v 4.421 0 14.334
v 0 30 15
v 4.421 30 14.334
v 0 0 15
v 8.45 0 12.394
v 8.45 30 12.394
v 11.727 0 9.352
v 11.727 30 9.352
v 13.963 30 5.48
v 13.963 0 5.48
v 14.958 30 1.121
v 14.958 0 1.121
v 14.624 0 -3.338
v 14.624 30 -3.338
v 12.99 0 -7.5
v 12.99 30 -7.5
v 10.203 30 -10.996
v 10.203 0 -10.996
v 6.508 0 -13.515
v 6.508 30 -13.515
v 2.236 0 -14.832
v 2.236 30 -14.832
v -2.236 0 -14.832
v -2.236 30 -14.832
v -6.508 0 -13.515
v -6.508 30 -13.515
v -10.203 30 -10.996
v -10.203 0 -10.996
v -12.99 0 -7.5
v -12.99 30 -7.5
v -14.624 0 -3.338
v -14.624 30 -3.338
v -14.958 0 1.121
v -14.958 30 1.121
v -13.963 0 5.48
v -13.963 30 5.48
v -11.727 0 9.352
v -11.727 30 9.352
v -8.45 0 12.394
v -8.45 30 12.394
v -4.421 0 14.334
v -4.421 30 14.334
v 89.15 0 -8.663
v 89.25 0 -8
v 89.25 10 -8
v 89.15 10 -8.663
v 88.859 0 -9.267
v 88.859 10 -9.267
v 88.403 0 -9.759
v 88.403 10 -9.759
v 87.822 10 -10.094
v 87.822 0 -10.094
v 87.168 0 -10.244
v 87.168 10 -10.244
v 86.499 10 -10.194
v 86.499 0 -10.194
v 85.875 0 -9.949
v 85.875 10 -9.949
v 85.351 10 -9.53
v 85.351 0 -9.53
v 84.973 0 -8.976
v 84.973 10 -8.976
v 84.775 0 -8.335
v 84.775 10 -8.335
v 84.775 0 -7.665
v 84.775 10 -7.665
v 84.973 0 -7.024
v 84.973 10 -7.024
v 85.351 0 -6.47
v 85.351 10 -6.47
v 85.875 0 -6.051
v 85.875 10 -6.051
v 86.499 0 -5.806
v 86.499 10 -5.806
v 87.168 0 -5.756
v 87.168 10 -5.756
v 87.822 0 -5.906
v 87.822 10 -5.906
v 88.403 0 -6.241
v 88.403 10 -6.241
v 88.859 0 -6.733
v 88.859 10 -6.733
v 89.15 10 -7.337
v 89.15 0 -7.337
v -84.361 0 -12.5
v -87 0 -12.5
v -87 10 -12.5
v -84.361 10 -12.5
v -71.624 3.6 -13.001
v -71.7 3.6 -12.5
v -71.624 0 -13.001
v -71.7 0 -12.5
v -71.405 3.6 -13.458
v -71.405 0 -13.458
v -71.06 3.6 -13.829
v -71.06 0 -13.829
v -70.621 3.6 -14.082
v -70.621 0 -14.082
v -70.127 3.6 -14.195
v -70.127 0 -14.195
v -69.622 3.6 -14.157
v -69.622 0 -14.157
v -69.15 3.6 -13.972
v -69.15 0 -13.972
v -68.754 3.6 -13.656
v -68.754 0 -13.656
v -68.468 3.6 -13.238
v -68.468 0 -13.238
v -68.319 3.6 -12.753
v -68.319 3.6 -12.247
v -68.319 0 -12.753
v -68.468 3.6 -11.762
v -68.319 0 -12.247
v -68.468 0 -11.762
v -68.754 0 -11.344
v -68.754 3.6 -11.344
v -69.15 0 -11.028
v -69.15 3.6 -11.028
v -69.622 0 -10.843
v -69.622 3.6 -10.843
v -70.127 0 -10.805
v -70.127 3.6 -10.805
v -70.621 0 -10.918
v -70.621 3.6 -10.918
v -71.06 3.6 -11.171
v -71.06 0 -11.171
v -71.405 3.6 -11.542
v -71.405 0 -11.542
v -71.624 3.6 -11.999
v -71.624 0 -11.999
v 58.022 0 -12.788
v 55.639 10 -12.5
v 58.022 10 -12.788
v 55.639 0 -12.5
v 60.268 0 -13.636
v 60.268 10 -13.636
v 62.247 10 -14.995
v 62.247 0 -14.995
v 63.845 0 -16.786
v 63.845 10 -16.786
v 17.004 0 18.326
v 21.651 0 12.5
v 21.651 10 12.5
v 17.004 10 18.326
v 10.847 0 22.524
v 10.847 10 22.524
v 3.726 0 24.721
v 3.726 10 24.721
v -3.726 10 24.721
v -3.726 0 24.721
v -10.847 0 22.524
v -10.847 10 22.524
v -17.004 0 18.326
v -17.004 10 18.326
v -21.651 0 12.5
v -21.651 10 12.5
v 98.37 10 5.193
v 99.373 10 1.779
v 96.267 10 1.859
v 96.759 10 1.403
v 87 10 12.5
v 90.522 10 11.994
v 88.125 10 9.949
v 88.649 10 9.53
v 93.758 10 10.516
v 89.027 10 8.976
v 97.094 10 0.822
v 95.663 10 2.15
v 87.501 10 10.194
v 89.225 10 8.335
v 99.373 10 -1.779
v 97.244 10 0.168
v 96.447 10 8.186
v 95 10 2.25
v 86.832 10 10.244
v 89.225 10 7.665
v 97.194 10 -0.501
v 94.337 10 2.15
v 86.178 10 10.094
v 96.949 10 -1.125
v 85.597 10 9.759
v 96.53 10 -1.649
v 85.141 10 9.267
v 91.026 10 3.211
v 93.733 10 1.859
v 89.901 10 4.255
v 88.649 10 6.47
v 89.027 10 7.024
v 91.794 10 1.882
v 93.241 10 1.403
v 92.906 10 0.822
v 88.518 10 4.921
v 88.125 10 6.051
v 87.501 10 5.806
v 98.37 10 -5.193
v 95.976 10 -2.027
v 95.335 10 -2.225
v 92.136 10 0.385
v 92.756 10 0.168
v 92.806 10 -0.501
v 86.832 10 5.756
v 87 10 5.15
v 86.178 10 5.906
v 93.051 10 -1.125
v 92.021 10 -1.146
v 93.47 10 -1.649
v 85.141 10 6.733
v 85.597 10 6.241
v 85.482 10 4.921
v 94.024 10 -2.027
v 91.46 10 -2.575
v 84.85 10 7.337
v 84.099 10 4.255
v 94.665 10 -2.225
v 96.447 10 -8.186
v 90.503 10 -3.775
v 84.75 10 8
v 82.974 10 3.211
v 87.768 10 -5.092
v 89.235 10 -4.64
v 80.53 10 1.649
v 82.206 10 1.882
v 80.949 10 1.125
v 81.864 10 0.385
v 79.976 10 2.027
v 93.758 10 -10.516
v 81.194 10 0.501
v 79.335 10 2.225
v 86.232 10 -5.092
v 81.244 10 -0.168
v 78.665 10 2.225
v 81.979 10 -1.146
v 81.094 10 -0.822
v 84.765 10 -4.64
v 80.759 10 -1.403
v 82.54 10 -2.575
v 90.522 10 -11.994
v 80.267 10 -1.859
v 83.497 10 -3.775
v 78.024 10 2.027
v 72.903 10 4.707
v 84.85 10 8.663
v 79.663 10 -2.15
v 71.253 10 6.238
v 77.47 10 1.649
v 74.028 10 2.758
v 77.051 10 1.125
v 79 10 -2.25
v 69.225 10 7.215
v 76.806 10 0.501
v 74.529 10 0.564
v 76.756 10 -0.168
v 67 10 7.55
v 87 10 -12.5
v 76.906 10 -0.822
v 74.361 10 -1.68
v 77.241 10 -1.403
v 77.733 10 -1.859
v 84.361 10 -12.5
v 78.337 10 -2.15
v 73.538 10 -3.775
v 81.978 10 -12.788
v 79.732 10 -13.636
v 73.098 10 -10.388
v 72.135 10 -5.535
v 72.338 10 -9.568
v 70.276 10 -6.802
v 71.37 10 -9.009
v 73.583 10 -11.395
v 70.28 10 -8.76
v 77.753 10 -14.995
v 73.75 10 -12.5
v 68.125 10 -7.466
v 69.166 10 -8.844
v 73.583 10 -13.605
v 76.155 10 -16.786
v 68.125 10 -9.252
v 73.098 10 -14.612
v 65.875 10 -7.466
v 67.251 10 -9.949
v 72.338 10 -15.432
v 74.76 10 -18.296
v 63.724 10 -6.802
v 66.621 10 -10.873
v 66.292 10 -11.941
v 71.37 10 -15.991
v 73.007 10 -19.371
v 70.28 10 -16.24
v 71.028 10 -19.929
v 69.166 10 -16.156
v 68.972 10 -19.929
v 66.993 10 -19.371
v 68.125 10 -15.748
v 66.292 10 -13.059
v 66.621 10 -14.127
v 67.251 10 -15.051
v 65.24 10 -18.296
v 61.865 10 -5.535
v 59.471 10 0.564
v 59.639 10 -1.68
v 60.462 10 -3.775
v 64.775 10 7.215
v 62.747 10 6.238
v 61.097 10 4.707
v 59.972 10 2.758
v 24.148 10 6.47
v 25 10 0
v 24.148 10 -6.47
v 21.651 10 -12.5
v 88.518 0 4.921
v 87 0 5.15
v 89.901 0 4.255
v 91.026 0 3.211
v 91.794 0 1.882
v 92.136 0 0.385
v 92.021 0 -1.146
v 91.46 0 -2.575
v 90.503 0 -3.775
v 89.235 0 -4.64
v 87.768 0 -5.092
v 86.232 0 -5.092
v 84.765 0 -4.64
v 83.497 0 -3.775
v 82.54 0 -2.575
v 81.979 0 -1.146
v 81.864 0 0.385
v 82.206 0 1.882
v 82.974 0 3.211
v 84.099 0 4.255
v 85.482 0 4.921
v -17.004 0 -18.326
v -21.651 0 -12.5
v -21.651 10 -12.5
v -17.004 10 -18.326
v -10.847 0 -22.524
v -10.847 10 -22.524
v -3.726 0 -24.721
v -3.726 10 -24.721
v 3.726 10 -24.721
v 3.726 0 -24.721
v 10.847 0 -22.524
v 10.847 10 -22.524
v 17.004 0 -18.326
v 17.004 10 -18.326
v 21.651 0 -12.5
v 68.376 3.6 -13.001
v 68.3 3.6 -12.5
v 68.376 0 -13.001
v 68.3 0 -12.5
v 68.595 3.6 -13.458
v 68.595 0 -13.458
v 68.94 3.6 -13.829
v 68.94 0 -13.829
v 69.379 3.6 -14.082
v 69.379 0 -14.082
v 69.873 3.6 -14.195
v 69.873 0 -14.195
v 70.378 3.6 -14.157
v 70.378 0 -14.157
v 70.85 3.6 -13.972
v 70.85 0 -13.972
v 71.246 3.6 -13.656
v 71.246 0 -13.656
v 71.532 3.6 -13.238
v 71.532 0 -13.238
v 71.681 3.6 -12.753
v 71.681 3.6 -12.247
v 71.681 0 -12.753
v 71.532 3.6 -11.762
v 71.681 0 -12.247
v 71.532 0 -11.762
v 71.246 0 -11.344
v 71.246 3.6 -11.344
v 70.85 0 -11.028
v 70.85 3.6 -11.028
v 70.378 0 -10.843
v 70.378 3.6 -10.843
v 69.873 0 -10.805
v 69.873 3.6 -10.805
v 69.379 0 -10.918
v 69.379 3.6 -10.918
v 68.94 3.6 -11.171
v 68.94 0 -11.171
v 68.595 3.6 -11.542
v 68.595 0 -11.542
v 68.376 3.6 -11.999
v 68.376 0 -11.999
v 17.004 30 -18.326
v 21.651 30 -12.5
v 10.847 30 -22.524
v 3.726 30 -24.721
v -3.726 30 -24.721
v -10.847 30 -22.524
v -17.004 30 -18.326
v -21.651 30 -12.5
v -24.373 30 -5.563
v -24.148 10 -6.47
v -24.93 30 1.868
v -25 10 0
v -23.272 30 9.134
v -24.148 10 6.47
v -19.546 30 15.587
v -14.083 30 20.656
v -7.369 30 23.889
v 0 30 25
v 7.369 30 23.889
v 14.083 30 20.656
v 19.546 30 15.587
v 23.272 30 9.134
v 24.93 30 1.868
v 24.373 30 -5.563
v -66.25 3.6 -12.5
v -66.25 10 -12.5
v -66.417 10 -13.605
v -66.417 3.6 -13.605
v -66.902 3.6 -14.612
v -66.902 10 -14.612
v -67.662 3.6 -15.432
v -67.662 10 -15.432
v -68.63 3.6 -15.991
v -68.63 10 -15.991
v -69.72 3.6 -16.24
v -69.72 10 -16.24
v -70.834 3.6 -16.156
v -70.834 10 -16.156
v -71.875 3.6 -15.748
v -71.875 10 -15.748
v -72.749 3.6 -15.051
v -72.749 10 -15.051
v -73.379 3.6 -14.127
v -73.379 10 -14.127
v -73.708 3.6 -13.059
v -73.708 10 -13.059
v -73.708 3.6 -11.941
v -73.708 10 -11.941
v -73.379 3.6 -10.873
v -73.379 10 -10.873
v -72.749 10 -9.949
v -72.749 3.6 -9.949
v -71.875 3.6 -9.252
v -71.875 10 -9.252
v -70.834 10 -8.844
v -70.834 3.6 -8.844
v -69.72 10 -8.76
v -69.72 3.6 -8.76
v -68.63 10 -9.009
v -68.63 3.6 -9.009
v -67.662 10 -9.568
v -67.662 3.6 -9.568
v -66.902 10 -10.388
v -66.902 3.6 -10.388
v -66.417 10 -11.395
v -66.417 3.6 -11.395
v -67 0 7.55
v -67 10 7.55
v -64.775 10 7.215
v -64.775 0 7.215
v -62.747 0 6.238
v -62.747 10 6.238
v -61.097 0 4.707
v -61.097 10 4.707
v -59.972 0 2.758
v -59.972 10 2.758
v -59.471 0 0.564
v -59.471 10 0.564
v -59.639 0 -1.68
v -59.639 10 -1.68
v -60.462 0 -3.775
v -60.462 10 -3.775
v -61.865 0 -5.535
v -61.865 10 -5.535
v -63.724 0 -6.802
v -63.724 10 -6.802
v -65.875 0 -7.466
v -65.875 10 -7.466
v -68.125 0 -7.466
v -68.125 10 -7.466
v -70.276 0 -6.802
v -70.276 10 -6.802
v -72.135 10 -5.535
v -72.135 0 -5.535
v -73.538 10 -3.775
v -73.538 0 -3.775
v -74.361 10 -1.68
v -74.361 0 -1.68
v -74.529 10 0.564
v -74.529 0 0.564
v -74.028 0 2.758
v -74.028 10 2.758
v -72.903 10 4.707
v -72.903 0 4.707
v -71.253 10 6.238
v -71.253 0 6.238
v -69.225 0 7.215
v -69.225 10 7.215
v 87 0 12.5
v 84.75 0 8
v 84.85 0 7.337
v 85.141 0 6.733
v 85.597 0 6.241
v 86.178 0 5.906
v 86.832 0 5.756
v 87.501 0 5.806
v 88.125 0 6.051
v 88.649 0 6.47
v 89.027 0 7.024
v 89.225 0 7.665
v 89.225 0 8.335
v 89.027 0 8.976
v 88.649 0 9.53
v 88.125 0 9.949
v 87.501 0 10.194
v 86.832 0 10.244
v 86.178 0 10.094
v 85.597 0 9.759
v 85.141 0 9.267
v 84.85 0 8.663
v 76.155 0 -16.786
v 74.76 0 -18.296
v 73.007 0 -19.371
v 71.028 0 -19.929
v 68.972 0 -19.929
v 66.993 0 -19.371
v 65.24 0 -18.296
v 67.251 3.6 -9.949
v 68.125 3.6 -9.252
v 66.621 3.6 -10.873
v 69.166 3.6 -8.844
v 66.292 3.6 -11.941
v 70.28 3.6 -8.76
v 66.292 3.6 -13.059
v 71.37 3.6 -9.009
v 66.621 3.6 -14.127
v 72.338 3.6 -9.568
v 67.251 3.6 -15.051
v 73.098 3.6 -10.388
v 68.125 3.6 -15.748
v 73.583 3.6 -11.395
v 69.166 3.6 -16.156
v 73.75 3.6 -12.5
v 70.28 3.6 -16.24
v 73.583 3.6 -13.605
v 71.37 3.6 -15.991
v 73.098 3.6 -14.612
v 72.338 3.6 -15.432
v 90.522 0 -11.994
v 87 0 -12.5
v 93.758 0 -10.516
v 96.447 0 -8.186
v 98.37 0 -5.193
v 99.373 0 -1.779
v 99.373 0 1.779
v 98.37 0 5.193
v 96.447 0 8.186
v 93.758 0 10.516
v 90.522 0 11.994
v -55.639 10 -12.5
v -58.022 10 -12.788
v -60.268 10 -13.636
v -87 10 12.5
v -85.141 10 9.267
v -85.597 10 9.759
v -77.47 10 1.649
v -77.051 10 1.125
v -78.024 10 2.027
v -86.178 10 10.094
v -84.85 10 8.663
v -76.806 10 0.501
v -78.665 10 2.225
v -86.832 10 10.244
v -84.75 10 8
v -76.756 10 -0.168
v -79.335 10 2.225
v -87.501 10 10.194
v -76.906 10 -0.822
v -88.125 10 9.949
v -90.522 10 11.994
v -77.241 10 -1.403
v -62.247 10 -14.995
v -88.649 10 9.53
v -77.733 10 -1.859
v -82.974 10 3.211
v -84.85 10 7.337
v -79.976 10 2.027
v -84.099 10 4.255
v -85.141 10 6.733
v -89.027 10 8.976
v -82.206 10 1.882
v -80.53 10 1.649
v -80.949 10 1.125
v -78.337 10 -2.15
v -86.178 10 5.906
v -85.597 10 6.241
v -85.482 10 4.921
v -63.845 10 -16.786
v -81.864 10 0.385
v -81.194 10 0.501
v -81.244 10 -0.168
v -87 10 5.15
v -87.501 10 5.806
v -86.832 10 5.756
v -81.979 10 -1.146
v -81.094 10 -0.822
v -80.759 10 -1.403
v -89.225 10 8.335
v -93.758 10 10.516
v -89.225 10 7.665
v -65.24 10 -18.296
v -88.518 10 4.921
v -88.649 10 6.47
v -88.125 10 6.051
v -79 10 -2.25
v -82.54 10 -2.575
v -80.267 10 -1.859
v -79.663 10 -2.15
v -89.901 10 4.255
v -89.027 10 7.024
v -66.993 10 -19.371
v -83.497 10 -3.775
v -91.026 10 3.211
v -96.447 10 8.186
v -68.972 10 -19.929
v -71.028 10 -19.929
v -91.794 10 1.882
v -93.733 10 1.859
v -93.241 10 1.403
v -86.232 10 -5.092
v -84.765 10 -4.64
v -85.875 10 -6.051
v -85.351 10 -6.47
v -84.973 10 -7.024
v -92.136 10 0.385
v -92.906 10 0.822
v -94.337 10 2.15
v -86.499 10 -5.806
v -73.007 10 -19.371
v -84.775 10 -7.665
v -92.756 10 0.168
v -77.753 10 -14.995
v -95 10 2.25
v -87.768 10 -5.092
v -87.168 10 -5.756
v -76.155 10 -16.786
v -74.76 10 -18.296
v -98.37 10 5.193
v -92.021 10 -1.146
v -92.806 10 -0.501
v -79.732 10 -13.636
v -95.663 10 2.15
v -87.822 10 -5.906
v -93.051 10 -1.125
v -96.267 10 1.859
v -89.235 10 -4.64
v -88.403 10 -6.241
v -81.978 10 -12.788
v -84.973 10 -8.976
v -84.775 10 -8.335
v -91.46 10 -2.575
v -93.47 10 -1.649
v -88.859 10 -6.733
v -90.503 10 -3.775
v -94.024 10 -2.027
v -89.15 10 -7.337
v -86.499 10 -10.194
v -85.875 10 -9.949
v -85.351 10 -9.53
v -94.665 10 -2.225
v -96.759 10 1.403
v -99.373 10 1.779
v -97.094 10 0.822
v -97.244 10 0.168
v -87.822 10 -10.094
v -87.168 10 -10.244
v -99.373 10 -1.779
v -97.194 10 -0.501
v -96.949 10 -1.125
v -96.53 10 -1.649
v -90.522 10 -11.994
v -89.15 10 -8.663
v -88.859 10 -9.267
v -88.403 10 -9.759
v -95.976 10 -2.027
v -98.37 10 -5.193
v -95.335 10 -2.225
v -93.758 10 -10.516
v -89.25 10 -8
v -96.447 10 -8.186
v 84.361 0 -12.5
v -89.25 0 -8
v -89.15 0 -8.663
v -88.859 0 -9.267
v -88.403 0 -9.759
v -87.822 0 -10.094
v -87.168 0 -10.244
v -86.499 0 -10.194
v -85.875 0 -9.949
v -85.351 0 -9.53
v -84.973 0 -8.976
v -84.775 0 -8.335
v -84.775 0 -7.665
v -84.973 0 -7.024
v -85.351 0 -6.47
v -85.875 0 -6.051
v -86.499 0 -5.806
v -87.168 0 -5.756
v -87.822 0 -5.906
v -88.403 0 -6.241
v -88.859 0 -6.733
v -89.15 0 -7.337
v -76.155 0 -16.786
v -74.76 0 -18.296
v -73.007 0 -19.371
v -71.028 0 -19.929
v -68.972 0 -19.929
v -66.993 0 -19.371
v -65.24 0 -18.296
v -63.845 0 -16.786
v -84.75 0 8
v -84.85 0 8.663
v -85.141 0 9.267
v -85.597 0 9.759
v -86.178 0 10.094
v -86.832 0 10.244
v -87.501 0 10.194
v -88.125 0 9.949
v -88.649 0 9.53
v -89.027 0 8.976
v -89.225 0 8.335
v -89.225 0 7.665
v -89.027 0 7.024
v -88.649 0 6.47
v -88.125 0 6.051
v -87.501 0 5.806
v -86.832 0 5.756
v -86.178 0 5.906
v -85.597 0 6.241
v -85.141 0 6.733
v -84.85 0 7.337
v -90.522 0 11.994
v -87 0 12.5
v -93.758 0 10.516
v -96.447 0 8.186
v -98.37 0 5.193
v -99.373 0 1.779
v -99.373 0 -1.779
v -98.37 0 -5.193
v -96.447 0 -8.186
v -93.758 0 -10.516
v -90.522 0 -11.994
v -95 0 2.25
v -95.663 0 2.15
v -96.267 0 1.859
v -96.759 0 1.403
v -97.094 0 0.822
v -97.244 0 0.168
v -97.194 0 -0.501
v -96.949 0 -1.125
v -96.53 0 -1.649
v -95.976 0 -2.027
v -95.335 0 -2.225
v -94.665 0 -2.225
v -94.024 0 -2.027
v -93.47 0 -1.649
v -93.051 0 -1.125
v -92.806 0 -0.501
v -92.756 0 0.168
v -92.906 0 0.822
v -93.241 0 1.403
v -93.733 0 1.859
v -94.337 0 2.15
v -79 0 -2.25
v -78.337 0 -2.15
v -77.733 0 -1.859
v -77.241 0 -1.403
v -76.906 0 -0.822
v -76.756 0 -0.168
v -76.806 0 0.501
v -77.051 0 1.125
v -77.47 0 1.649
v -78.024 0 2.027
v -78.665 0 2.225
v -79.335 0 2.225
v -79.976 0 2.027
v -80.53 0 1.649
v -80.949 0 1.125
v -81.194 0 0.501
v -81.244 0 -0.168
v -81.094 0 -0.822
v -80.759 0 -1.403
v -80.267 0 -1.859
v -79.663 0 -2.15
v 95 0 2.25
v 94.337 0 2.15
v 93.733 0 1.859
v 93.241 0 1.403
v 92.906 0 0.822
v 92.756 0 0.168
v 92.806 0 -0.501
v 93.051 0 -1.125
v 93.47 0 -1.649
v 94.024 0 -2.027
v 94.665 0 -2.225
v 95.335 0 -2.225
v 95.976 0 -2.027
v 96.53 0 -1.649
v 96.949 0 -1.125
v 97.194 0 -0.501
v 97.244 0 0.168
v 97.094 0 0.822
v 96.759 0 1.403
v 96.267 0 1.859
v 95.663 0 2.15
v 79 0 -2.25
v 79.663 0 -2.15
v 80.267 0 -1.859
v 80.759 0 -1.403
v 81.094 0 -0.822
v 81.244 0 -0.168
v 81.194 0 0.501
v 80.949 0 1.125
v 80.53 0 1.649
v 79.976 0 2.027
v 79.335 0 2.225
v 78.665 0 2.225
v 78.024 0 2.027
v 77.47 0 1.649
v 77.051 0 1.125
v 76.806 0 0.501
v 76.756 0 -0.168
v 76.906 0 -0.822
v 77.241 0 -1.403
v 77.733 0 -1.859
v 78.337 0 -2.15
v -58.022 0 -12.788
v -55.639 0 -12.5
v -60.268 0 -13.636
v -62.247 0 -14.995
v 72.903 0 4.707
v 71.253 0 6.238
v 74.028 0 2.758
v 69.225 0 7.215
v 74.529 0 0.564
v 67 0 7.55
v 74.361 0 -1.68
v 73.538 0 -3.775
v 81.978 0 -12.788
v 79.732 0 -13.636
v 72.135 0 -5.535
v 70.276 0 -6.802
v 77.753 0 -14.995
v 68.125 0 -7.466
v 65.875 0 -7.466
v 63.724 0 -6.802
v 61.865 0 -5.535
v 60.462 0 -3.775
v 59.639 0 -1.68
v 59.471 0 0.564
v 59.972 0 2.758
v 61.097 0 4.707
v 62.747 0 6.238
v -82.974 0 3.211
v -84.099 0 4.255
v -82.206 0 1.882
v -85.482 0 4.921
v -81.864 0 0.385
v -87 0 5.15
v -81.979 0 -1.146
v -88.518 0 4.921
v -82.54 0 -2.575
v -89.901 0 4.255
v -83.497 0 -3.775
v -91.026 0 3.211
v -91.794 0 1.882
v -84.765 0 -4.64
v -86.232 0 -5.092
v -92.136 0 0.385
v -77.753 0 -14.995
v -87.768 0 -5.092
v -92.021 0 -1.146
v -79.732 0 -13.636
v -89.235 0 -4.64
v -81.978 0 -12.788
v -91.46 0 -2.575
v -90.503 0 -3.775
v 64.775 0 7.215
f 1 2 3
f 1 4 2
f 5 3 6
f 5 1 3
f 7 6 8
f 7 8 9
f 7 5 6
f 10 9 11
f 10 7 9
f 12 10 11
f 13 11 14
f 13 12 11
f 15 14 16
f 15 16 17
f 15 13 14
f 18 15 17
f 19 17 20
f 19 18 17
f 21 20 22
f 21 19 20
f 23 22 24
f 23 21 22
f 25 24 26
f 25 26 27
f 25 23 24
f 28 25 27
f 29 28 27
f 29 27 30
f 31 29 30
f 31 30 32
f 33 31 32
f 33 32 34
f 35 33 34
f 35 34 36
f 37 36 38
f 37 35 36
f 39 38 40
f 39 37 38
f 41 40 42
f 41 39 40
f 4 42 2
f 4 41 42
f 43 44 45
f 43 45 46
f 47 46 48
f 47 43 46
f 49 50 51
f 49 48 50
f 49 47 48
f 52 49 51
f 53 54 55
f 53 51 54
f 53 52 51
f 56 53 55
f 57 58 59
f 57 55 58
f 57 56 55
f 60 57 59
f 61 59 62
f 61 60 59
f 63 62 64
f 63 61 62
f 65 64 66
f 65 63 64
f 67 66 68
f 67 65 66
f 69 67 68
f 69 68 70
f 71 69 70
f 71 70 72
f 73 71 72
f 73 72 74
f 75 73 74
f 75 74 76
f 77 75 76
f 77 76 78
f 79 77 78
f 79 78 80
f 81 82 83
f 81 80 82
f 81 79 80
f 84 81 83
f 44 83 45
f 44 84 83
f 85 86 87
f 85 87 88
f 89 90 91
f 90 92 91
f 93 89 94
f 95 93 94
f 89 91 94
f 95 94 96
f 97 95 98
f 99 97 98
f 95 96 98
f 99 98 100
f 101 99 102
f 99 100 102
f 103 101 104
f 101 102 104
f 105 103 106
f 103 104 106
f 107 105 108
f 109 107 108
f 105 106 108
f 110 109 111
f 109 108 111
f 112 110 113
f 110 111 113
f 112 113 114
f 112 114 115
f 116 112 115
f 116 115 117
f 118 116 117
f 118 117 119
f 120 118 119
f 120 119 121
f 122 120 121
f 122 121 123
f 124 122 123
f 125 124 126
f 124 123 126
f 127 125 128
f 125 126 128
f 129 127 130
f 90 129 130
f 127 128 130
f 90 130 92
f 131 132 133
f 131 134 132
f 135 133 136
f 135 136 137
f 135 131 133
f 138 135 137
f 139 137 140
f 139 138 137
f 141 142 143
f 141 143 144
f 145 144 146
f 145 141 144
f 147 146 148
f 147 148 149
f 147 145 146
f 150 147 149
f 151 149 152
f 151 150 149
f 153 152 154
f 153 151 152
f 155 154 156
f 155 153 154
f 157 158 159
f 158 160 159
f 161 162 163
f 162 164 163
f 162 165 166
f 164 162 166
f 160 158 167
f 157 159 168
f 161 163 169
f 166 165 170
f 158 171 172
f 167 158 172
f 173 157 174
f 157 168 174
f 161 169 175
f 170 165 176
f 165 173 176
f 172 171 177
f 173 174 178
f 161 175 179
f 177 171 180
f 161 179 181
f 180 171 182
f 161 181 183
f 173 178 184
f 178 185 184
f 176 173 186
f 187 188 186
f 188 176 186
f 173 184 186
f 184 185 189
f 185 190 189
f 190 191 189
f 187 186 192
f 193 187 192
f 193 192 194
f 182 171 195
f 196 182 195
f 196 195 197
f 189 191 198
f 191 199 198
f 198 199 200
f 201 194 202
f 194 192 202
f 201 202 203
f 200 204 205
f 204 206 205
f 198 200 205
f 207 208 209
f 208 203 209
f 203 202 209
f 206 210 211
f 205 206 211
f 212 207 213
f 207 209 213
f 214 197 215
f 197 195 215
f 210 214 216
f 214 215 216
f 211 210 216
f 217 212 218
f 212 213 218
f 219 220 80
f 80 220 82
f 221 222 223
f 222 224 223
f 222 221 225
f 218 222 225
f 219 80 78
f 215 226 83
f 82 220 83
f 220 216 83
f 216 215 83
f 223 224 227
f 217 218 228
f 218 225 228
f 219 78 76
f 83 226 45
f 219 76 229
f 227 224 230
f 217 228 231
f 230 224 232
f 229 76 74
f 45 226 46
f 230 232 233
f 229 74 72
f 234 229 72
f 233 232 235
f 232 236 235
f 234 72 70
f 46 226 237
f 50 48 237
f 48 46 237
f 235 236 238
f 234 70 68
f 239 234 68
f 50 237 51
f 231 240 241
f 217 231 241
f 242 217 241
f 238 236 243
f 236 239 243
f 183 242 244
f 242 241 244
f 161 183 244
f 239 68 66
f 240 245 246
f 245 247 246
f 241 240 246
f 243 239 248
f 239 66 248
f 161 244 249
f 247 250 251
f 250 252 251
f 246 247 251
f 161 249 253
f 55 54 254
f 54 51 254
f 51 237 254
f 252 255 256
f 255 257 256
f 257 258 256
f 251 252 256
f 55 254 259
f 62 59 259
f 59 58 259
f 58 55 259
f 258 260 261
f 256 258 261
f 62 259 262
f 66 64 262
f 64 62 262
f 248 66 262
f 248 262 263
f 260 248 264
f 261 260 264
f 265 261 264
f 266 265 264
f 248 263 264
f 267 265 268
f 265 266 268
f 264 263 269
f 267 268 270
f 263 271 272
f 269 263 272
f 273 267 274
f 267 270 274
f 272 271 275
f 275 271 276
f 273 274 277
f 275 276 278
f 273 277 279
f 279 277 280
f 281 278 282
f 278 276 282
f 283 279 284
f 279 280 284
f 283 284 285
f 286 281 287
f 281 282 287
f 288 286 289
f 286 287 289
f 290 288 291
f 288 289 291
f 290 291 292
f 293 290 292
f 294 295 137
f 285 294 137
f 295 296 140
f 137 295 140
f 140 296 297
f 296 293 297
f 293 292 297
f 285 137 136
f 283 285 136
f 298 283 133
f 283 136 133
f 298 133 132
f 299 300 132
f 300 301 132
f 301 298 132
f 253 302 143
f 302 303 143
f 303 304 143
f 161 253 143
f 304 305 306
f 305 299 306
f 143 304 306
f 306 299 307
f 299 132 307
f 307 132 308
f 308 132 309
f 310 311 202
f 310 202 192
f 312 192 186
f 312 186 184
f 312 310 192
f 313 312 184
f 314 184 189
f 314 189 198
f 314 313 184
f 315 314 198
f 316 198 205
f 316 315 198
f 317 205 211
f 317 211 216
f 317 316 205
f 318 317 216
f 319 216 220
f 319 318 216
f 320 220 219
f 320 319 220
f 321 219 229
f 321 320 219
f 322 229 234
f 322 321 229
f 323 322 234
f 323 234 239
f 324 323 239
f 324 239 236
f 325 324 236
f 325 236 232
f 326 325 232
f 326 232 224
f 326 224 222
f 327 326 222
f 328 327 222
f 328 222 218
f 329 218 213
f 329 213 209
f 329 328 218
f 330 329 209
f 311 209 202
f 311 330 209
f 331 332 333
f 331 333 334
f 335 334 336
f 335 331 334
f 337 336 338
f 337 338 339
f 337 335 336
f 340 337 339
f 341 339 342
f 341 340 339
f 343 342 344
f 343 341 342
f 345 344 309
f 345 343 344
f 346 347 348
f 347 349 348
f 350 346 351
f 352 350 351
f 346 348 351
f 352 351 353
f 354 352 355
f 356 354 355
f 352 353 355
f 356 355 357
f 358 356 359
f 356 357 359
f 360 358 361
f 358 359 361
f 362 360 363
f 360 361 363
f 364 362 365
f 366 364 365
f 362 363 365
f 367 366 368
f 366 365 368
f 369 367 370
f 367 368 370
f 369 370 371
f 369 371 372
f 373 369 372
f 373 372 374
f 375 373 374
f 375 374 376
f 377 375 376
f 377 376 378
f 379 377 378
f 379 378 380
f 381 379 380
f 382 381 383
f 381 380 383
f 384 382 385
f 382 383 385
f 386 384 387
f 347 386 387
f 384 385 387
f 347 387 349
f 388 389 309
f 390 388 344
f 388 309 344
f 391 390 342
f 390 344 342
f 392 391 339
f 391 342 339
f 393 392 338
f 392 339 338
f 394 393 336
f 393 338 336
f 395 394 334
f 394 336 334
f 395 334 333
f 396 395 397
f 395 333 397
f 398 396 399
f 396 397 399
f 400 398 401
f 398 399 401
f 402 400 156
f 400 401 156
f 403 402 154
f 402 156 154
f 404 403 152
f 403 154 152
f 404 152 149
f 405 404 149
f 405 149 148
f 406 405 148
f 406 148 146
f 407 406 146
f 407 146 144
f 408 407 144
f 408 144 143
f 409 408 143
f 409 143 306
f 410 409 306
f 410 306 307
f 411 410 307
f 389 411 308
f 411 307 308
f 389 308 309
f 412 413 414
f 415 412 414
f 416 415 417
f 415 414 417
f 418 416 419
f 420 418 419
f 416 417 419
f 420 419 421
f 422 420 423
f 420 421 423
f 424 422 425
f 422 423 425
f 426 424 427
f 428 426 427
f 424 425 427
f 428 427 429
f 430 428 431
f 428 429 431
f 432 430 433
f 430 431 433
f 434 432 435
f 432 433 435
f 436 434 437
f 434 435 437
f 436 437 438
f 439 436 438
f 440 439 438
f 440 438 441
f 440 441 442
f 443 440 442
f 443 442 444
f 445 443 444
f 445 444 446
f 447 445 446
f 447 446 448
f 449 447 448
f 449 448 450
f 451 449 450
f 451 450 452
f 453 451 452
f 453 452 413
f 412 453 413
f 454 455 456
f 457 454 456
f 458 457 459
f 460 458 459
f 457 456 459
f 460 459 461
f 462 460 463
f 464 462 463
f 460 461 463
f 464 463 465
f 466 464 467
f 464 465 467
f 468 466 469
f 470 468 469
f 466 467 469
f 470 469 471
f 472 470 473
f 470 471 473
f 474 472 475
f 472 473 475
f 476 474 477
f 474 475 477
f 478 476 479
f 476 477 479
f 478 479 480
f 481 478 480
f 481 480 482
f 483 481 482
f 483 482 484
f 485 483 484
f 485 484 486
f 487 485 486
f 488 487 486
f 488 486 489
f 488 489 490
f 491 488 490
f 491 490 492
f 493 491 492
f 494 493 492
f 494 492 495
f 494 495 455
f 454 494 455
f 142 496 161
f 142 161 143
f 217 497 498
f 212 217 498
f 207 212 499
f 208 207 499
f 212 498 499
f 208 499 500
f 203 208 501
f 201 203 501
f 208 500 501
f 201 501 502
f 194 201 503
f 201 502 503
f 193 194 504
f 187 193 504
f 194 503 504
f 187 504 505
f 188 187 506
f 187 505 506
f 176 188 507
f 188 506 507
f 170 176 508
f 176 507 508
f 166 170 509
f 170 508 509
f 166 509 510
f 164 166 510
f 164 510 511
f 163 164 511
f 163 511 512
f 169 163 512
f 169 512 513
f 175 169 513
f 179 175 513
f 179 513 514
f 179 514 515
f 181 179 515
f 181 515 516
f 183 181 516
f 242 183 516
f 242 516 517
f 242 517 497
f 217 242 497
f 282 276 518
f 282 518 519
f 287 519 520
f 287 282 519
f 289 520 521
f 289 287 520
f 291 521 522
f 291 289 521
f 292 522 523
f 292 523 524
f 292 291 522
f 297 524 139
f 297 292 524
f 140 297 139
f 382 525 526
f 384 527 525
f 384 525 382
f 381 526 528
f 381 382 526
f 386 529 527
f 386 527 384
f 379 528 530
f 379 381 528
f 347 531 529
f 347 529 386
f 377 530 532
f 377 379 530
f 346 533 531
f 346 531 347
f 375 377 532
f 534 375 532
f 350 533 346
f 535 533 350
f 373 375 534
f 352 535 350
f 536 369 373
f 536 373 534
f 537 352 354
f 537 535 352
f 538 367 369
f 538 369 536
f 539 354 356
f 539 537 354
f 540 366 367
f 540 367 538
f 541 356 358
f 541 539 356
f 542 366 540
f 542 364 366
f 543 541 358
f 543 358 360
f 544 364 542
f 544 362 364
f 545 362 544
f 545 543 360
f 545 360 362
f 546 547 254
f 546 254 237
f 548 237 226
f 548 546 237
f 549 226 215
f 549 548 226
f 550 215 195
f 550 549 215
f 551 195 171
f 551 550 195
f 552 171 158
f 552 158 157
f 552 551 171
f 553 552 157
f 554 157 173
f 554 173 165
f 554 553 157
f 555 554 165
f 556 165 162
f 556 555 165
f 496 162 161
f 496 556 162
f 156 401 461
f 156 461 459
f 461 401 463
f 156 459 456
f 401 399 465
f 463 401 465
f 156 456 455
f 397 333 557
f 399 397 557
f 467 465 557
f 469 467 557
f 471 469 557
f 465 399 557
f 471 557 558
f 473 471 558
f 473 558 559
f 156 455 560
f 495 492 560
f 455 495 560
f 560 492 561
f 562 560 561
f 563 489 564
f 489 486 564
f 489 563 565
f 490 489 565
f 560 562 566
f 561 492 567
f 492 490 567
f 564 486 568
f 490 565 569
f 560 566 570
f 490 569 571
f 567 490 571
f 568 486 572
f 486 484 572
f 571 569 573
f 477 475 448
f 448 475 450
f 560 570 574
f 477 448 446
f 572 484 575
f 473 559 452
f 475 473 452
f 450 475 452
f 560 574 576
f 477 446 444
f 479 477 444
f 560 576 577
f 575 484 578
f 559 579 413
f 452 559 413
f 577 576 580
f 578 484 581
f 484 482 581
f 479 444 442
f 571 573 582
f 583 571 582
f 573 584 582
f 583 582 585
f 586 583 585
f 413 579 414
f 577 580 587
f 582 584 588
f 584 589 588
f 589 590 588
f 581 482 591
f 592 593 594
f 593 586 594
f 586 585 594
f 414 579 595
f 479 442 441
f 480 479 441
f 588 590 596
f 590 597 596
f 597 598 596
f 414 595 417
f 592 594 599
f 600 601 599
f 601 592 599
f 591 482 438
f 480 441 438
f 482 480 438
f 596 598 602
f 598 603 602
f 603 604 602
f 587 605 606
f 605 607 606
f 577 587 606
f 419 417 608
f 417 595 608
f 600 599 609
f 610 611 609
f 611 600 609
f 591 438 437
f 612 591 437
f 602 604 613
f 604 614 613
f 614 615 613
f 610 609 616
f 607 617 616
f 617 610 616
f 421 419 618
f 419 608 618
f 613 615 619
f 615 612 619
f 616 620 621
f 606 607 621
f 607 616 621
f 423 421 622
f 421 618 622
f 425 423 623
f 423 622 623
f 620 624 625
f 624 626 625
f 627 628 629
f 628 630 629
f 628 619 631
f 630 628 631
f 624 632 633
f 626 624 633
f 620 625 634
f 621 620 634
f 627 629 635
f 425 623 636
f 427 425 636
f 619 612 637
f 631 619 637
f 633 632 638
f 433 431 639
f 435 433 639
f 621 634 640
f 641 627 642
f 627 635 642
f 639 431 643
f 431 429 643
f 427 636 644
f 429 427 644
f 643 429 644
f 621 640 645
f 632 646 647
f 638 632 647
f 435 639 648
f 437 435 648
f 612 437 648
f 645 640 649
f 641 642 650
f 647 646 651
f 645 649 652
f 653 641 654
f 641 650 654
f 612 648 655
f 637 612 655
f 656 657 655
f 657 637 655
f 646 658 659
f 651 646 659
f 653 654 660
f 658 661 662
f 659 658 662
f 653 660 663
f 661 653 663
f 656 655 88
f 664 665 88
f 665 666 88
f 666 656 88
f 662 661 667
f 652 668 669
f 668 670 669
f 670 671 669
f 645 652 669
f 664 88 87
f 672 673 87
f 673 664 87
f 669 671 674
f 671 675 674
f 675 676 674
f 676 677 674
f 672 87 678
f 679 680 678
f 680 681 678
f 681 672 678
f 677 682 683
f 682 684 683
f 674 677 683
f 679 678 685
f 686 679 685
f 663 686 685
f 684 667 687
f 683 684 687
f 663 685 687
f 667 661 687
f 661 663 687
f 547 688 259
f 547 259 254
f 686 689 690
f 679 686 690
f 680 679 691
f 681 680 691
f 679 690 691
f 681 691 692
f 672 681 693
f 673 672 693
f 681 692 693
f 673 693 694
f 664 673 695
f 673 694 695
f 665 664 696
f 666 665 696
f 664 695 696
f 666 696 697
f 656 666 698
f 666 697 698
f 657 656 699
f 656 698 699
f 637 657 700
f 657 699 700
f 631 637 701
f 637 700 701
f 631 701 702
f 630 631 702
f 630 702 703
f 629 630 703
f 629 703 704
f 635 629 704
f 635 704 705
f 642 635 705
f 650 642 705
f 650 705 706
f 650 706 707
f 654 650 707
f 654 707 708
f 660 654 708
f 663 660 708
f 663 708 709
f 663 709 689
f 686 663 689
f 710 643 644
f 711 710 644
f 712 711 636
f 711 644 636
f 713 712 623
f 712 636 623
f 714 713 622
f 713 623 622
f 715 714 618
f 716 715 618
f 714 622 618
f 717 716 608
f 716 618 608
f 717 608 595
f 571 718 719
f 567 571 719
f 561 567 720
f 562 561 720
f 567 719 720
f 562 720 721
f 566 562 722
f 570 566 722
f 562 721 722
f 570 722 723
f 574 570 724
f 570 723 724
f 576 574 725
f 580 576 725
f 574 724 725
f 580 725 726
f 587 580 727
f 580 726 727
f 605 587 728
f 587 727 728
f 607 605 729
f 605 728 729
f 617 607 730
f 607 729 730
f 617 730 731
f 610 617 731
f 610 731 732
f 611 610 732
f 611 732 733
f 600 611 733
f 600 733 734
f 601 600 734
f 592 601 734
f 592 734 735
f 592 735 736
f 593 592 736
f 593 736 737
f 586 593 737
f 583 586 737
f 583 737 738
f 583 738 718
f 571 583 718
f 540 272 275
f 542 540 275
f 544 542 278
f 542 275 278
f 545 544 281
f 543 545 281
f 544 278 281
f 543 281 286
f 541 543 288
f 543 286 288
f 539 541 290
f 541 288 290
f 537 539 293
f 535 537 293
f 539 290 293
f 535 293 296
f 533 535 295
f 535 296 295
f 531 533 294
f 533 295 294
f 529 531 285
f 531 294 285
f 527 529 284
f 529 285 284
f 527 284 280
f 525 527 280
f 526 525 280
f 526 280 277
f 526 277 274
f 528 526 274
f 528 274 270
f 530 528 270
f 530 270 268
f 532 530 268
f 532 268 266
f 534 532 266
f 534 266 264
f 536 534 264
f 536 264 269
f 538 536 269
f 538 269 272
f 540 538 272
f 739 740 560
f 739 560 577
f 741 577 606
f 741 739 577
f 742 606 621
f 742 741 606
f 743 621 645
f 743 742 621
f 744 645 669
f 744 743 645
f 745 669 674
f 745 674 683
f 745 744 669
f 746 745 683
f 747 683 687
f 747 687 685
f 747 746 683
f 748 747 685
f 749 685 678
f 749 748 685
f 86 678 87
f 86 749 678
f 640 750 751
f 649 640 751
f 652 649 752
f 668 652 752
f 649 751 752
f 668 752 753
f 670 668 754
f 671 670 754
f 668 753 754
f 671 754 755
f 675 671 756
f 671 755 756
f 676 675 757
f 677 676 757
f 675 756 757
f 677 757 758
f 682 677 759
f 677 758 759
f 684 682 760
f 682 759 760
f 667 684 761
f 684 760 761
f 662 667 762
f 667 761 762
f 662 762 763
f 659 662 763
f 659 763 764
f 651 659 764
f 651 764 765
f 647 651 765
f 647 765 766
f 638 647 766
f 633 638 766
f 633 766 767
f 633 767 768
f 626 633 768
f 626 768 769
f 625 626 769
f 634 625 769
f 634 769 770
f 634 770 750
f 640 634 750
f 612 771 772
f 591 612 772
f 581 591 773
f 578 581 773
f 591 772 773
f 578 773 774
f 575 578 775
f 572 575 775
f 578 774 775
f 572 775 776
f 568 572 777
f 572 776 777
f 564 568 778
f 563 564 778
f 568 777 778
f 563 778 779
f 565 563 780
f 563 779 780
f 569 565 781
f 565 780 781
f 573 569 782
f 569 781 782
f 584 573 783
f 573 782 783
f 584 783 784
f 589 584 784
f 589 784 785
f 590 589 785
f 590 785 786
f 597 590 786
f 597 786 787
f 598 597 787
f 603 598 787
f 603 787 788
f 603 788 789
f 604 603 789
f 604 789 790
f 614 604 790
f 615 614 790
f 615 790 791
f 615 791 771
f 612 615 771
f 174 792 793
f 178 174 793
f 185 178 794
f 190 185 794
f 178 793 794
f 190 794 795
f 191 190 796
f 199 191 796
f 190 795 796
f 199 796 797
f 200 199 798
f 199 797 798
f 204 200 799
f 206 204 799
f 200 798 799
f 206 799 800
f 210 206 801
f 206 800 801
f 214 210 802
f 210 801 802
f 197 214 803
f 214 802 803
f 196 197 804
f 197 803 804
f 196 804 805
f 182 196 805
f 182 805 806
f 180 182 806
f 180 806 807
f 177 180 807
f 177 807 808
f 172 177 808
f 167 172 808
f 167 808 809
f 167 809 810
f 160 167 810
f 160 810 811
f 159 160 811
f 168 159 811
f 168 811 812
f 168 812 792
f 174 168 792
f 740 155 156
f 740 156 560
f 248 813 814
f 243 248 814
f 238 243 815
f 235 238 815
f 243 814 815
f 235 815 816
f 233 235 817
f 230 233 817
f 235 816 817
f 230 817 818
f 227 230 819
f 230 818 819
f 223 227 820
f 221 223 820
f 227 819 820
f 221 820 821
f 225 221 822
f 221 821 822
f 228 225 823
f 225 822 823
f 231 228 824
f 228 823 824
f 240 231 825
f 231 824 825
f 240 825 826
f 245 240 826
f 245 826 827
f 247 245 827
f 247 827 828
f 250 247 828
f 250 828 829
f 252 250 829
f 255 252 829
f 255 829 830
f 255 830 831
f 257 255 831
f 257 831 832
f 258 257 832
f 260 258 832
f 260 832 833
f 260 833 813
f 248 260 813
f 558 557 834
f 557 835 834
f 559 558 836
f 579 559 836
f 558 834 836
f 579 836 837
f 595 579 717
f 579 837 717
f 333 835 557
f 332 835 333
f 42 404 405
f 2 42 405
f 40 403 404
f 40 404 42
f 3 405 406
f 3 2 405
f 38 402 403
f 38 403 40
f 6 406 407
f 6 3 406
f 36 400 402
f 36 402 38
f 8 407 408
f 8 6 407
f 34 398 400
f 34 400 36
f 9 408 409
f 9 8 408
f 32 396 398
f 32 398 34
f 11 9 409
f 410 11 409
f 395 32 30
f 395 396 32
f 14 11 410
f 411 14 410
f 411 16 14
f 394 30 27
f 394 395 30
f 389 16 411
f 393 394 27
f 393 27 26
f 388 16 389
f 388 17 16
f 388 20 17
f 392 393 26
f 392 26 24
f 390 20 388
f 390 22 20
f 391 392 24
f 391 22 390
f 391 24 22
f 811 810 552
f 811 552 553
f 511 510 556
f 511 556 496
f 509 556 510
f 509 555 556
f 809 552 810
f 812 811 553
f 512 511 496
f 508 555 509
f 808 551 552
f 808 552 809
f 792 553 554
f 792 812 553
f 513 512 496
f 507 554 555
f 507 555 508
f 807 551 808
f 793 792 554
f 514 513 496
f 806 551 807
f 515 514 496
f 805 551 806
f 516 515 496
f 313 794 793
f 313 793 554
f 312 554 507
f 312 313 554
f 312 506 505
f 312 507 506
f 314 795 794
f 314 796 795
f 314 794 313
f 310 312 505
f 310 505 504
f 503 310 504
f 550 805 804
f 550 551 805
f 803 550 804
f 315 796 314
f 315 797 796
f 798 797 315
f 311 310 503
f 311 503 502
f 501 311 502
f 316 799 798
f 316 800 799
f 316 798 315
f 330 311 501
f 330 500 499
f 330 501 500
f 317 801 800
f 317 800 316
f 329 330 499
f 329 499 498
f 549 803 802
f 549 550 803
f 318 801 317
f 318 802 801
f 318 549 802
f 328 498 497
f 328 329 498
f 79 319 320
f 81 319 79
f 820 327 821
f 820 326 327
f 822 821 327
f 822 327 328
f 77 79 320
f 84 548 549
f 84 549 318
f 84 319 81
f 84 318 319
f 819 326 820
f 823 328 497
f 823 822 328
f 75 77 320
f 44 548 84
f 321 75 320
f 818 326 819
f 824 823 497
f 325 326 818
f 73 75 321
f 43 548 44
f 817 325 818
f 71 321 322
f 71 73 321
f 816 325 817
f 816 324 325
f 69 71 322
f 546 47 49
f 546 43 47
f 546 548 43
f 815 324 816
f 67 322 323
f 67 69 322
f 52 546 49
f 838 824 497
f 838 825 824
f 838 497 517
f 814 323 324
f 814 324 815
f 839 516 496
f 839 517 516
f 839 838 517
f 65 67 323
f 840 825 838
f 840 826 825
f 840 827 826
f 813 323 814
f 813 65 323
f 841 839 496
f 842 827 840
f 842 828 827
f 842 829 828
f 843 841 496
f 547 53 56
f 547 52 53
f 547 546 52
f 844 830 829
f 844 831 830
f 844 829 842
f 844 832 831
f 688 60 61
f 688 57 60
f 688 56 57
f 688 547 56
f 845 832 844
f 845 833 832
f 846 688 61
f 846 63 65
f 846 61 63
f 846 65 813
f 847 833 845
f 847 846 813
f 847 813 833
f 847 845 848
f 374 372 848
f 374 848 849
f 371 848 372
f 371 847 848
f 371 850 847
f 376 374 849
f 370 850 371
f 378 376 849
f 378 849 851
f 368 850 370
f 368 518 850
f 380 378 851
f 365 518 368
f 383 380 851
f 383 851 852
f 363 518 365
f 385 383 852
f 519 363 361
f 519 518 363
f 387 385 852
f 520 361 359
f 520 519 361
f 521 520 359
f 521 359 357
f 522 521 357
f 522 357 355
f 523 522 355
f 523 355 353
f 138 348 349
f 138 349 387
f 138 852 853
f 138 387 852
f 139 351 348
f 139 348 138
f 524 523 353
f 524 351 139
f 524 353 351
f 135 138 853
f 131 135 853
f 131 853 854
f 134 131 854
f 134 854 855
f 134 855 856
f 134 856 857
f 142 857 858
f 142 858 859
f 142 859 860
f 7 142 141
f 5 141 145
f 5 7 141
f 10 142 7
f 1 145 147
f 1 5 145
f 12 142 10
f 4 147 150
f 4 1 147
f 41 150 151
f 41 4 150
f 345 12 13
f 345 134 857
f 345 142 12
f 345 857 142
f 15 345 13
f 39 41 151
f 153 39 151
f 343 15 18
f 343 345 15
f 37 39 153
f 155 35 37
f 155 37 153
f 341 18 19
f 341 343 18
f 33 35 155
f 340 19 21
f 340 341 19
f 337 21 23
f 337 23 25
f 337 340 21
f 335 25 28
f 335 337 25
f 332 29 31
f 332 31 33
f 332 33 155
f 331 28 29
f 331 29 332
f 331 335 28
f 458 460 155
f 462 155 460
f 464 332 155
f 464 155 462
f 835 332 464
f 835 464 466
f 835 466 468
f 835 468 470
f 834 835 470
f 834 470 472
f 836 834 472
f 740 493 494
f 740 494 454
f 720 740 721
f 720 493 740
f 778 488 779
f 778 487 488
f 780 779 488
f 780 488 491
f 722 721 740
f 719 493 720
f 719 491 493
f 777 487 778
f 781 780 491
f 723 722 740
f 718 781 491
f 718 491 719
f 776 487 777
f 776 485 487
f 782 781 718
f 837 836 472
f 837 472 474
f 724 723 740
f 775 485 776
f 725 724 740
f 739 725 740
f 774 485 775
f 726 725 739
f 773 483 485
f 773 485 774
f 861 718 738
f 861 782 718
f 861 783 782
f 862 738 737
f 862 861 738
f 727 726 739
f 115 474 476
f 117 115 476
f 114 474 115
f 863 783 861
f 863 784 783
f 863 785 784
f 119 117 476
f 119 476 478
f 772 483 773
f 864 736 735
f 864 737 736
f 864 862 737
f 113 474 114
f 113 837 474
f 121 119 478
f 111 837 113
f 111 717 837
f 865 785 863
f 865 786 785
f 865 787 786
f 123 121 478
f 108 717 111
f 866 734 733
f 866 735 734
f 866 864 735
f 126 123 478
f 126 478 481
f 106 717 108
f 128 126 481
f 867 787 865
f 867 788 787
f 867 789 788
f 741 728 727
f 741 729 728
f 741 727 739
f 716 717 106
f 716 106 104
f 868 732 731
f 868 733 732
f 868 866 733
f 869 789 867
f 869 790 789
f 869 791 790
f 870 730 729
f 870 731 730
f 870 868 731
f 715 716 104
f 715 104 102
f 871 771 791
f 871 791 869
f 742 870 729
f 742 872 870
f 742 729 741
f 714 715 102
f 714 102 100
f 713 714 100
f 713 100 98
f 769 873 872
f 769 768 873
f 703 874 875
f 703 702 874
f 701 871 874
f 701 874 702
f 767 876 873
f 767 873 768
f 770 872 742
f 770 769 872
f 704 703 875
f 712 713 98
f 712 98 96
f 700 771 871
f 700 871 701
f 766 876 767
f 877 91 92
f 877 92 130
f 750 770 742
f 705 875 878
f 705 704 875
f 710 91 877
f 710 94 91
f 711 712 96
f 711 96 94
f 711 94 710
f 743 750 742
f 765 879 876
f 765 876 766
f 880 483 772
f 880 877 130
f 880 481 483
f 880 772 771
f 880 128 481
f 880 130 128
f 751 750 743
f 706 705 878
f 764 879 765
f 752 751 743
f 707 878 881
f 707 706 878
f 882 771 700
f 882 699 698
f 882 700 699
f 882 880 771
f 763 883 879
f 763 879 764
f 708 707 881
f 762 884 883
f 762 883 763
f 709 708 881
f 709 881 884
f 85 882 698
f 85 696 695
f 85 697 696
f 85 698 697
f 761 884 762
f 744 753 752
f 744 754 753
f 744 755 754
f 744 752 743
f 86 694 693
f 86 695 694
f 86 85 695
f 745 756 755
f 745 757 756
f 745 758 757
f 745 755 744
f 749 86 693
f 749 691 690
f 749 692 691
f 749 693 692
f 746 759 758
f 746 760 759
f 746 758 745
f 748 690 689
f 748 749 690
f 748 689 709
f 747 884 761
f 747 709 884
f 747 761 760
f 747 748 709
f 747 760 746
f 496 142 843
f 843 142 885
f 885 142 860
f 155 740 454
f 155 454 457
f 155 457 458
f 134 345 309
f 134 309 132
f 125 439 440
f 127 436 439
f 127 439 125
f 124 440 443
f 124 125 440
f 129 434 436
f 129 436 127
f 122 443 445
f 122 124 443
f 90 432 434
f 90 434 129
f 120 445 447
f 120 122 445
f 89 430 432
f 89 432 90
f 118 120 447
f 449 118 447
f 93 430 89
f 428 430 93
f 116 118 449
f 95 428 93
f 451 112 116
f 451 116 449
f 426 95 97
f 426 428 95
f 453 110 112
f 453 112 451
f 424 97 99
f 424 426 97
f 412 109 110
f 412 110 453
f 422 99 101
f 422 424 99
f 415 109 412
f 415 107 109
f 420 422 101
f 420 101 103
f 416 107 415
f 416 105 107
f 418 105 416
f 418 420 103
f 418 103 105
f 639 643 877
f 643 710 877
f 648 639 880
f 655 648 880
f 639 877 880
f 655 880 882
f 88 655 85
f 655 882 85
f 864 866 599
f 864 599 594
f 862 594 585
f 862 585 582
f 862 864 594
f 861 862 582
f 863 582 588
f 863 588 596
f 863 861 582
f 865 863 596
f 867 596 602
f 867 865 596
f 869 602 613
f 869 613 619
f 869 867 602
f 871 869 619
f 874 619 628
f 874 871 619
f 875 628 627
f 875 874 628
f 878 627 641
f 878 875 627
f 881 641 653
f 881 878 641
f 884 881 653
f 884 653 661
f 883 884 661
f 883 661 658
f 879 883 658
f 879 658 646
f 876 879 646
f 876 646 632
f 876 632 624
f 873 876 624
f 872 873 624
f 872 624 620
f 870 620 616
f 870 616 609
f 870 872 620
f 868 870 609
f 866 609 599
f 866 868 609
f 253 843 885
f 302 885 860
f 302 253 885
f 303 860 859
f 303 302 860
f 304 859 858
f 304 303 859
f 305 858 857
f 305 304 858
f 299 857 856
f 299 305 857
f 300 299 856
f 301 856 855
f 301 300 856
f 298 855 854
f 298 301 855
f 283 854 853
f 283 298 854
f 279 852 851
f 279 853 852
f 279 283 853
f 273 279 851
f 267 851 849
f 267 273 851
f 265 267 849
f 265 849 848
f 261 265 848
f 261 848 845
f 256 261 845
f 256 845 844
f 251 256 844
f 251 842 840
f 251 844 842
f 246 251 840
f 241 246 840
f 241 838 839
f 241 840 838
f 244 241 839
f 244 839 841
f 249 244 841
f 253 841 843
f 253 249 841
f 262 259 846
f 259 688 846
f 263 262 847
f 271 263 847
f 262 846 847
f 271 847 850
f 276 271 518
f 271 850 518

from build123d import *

# Parameters (mm, degrees)
ESQUISSE1_R                                        = 5.15
ESQUISSE1_R_2                                      = 15
BOSS_EXTRU_1_DEPTH                                 = 10
DIAM_TRE_DU_PER_AGE_4_5_4_5_1_D                    = 4.5
R_P_TITION_CIRCULAIRE1_COUNT                       = 4
ESQUISSE4_R                                        = 7.55
ENL_V_MAT_EXTRU_1_DEPTH                            = 104.078853311
SYM_TRIE1_COPY_1_D                                 = 4.5
SYM_TRIE1_COPY_2_D                                 = 4.5
SYM_TRIE1_COPY_3_D                                 = 4.5
ESQUISSE7_R                                        = 25
ESQUISSE7_R_2                                      = 15
BOSS_EXTRU_3_DEPTH                                 = 20
BOSS_EXTRU_4_DEPTH                                 = 10
CHAMBRAGE_POUR_VIS_T_TE_RONDE_BOMB_E_M_D           = 3.4
CHAMBRAGE_POUR_VIS_T_TE_RONDE_BOMB_E_M_CBORE_D     = 7.5
CHAMBRAGE_POUR_VIS_T_TE_RONDE_BOMB_E_M_CBORE_DEPTH = 6.4
CONG_1_R                                           = 10


with BuildPart() as part:
    # Esquisse1 → Boss.-Extru.1 (new body)
    with BuildSketch(Plane(origin=(0, 0, 0), x_dir=(1, 0, 0), z_dir=(0, 1, 0))):
        with BuildLine():
            Line((87, -12.5), (21.650635095, -12.5))
            ThreePointArc((21.650635095, -12.5), (0, -25), (-21.650635095, -12.5))
            Line((-21.650635095, -12.5), (-87, -12.5))
            ThreePointArc((-87, -12.5), (-99.5, 0), (-87, 12.5))
            Line((-87, 12.5), (-21.650635095, 12.5))
            ThreePointArc((-21.650635095, 12.5), (0, 25), (21.650635095, 12.5))
            Line((21.650635095, 12.5), (87, 12.5))
            ThreePointArc((87, 12.5), (99.5, 0), (87, -12.5))
        make_face()
        with Locations(Location((-87, 0, 0), (0, 0, 270))):
            Circle(ESQUISSE1_R, mode=Mode.SUBTRACT)
        with Locations(Location((87, 0, 0), (0, 0, 270))):
            Circle(ESQUISSE1_R, mode=Mode.SUBTRACT)
        with Locations(Location((0, 0, 0), (0, 0, 270))):
            Circle(ESQUISSE1_R_2, mode=Mode.SUBTRACT)
    extrude(amount=BOSS_EXTRU_1_DEPTH)

    # Diamètre du perçage Ø4.5 (4.5)1 (through all)
    with Locations(Plane(origin=(0, 10, 0), x_dir=(1, 0, 0), z_dir=(0, 1, 0))):
        with Locations((-87, 8)):
            diam_tre_du_per_age_4_5_4_5_1 = Hole(DIAM_TRE_DU_PER_AGE_4_5_4_5_1_D / 2)

    # Répétition circulaire1: Diamètre du perçage Ø4.5 (4.5)1 ×4 about axis
    r_p_tition_circulaire1_axis = Axis((-87, 0, 0), (0, 1, 0))
    for i in range(1, R_P_TITION_CIRCULAIRE1_COUNT):
        add(diam_tre_du_per_age_4_5_4_5_1.rotate(r_p_tition_circulaire1_axis, i * 360 / R_P_TITION_CIRCULAIRE1_COUNT), mode=Mode.SUBTRACT)

    # Esquisse4 → Enlèv. mat.-Extru.1 (cut, through all)
    with BuildSketch(Plane(origin=(0, 10, 0), x_dir=(1, 0, 0), z_dir=(0, 1, 0))):
        with Locations(Location((-67, 0, 0), (0, 0, 270))):
            Circle(ESQUISSE4_R)
    enl_v_mat_extru_1 = extrude(amount=-ENL_V_MAT_EXTRU_1_DEPTH, mode=Mode.SUBTRACT)

    # Symétrie1: Diamètre du perçage Ø4.5 (4.5)1, Enlèv. mat.-Extru.1 across plane
    add(diam_tre_du_per_age_4_5_4_5_1.mirror(Plane(origin=(0, 0, 0), x_dir=(0, 0, 1), z_dir=(1, 0, 0))), mode=Mode.SUBTRACT)
    add(enl_v_mat_extru_1.mirror(Plane(origin=(0, 0, 0), x_dir=(0, 0, 1), z_dir=(1, 0, 0))), mode=Mode.SUBTRACT)

    # Symétrie1 copy 1 (through all)
    with Locations(Plane(origin=(87, 10, -87), x_dir=(0, 0, -1), z_dir=(0, 1, 0))):
        with Locations((-87, -8)):
            Hole(SYM_TRIE1_COPY_1_D / 2)

    # Symétrie1 copy 2 (through all)
    with Locations(Plane(origin=(174, 10, 0), x_dir=(1, 0, 0), z_dir=(0, 1, 0))):
        with Locations((-87, -8)):
            Hole(SYM_TRIE1_COPY_2_D / 2)

    # Symétrie1 copy 3 (through all)
    with Locations(Plane(origin=(87, 10, 87), x_dir=(0, 0, 1), z_dir=(0, 1, 0))):
        with Locations((-87, -8)):
            Hole(SYM_TRIE1_COPY_3_D / 2)

    # Esquisse7 → Boss.-Extru.3 (add)
    with BuildSketch(Plane(origin=(0, 10, 0), x_dir=(1, 0, 0), z_dir=(0, 1, 0))):
        with Locations(Location((0, 0, 0), (0, 0, 30))):
            Circle(ESQUISSE7_R)
        with Locations(Location((0, 0, 0), (0, 0, 270))):
            Circle(ESQUISSE7_R_2, mode=Mode.SUBTRACT)
    extrude(amount=BOSS_EXTRU_3_DEPTH)

    # Esquisse8 → Boss.-Extru.4 (add, through all)
    with BuildSketch(Plane(origin=(0, 10, 0), x_dir=(1, 0, 0), z_dir=(0, 1, 0))):
        with BuildLine():
            Line((62.5, 12.5), (77.5, 12.5))
            ThreePointArc((77.5, 12.5), (70, 20), (62.5, 12.5))
        make_face()
        with BuildLine():
            Line((-62.5, 12.5), (-77.5, 12.5))
            ThreePointArc((-77.5, 12.5), (-70, 20), (-62.5, 12.5))
        make_face()
    extrude(amount=-BOSS_EXTRU_4_DEPTH)

    # Chambrage pour vis à tête ronde bombée M31 (through all)
    with Locations(Plane(origin=(0, 10, 0), x_dir=(1, 0, 0), z_dir=(0, 1, 0))):
        with Locations((70, 12.5), (-70, 12.5)):
            CounterBoreHole(CHAMBRAGE_POUR_VIS_T_TE_RONDE_BOMB_E_M_D / 2, CHAMBRAGE_POUR_VIS_T_TE_RONDE_BOMB_E_M_CBORE_D / 2, CHAMBRAGE_POUR_VIS_T_TE_RONDE_BOMB_E_M_CBORE_DEPTH)

    # Congé1
    cong_1_edges = [part.edges().sort_by_distance(p)[0] for p in [
        (62.5, 5, -12.5),
        (77.5, 5, -12.5),
        (-77.5, 5, -12.5),
        (-62.5, 5, -12.5),
    ]]
    fillet(cong_1_edges, radius=CONG_1_R)


solid = part.part
